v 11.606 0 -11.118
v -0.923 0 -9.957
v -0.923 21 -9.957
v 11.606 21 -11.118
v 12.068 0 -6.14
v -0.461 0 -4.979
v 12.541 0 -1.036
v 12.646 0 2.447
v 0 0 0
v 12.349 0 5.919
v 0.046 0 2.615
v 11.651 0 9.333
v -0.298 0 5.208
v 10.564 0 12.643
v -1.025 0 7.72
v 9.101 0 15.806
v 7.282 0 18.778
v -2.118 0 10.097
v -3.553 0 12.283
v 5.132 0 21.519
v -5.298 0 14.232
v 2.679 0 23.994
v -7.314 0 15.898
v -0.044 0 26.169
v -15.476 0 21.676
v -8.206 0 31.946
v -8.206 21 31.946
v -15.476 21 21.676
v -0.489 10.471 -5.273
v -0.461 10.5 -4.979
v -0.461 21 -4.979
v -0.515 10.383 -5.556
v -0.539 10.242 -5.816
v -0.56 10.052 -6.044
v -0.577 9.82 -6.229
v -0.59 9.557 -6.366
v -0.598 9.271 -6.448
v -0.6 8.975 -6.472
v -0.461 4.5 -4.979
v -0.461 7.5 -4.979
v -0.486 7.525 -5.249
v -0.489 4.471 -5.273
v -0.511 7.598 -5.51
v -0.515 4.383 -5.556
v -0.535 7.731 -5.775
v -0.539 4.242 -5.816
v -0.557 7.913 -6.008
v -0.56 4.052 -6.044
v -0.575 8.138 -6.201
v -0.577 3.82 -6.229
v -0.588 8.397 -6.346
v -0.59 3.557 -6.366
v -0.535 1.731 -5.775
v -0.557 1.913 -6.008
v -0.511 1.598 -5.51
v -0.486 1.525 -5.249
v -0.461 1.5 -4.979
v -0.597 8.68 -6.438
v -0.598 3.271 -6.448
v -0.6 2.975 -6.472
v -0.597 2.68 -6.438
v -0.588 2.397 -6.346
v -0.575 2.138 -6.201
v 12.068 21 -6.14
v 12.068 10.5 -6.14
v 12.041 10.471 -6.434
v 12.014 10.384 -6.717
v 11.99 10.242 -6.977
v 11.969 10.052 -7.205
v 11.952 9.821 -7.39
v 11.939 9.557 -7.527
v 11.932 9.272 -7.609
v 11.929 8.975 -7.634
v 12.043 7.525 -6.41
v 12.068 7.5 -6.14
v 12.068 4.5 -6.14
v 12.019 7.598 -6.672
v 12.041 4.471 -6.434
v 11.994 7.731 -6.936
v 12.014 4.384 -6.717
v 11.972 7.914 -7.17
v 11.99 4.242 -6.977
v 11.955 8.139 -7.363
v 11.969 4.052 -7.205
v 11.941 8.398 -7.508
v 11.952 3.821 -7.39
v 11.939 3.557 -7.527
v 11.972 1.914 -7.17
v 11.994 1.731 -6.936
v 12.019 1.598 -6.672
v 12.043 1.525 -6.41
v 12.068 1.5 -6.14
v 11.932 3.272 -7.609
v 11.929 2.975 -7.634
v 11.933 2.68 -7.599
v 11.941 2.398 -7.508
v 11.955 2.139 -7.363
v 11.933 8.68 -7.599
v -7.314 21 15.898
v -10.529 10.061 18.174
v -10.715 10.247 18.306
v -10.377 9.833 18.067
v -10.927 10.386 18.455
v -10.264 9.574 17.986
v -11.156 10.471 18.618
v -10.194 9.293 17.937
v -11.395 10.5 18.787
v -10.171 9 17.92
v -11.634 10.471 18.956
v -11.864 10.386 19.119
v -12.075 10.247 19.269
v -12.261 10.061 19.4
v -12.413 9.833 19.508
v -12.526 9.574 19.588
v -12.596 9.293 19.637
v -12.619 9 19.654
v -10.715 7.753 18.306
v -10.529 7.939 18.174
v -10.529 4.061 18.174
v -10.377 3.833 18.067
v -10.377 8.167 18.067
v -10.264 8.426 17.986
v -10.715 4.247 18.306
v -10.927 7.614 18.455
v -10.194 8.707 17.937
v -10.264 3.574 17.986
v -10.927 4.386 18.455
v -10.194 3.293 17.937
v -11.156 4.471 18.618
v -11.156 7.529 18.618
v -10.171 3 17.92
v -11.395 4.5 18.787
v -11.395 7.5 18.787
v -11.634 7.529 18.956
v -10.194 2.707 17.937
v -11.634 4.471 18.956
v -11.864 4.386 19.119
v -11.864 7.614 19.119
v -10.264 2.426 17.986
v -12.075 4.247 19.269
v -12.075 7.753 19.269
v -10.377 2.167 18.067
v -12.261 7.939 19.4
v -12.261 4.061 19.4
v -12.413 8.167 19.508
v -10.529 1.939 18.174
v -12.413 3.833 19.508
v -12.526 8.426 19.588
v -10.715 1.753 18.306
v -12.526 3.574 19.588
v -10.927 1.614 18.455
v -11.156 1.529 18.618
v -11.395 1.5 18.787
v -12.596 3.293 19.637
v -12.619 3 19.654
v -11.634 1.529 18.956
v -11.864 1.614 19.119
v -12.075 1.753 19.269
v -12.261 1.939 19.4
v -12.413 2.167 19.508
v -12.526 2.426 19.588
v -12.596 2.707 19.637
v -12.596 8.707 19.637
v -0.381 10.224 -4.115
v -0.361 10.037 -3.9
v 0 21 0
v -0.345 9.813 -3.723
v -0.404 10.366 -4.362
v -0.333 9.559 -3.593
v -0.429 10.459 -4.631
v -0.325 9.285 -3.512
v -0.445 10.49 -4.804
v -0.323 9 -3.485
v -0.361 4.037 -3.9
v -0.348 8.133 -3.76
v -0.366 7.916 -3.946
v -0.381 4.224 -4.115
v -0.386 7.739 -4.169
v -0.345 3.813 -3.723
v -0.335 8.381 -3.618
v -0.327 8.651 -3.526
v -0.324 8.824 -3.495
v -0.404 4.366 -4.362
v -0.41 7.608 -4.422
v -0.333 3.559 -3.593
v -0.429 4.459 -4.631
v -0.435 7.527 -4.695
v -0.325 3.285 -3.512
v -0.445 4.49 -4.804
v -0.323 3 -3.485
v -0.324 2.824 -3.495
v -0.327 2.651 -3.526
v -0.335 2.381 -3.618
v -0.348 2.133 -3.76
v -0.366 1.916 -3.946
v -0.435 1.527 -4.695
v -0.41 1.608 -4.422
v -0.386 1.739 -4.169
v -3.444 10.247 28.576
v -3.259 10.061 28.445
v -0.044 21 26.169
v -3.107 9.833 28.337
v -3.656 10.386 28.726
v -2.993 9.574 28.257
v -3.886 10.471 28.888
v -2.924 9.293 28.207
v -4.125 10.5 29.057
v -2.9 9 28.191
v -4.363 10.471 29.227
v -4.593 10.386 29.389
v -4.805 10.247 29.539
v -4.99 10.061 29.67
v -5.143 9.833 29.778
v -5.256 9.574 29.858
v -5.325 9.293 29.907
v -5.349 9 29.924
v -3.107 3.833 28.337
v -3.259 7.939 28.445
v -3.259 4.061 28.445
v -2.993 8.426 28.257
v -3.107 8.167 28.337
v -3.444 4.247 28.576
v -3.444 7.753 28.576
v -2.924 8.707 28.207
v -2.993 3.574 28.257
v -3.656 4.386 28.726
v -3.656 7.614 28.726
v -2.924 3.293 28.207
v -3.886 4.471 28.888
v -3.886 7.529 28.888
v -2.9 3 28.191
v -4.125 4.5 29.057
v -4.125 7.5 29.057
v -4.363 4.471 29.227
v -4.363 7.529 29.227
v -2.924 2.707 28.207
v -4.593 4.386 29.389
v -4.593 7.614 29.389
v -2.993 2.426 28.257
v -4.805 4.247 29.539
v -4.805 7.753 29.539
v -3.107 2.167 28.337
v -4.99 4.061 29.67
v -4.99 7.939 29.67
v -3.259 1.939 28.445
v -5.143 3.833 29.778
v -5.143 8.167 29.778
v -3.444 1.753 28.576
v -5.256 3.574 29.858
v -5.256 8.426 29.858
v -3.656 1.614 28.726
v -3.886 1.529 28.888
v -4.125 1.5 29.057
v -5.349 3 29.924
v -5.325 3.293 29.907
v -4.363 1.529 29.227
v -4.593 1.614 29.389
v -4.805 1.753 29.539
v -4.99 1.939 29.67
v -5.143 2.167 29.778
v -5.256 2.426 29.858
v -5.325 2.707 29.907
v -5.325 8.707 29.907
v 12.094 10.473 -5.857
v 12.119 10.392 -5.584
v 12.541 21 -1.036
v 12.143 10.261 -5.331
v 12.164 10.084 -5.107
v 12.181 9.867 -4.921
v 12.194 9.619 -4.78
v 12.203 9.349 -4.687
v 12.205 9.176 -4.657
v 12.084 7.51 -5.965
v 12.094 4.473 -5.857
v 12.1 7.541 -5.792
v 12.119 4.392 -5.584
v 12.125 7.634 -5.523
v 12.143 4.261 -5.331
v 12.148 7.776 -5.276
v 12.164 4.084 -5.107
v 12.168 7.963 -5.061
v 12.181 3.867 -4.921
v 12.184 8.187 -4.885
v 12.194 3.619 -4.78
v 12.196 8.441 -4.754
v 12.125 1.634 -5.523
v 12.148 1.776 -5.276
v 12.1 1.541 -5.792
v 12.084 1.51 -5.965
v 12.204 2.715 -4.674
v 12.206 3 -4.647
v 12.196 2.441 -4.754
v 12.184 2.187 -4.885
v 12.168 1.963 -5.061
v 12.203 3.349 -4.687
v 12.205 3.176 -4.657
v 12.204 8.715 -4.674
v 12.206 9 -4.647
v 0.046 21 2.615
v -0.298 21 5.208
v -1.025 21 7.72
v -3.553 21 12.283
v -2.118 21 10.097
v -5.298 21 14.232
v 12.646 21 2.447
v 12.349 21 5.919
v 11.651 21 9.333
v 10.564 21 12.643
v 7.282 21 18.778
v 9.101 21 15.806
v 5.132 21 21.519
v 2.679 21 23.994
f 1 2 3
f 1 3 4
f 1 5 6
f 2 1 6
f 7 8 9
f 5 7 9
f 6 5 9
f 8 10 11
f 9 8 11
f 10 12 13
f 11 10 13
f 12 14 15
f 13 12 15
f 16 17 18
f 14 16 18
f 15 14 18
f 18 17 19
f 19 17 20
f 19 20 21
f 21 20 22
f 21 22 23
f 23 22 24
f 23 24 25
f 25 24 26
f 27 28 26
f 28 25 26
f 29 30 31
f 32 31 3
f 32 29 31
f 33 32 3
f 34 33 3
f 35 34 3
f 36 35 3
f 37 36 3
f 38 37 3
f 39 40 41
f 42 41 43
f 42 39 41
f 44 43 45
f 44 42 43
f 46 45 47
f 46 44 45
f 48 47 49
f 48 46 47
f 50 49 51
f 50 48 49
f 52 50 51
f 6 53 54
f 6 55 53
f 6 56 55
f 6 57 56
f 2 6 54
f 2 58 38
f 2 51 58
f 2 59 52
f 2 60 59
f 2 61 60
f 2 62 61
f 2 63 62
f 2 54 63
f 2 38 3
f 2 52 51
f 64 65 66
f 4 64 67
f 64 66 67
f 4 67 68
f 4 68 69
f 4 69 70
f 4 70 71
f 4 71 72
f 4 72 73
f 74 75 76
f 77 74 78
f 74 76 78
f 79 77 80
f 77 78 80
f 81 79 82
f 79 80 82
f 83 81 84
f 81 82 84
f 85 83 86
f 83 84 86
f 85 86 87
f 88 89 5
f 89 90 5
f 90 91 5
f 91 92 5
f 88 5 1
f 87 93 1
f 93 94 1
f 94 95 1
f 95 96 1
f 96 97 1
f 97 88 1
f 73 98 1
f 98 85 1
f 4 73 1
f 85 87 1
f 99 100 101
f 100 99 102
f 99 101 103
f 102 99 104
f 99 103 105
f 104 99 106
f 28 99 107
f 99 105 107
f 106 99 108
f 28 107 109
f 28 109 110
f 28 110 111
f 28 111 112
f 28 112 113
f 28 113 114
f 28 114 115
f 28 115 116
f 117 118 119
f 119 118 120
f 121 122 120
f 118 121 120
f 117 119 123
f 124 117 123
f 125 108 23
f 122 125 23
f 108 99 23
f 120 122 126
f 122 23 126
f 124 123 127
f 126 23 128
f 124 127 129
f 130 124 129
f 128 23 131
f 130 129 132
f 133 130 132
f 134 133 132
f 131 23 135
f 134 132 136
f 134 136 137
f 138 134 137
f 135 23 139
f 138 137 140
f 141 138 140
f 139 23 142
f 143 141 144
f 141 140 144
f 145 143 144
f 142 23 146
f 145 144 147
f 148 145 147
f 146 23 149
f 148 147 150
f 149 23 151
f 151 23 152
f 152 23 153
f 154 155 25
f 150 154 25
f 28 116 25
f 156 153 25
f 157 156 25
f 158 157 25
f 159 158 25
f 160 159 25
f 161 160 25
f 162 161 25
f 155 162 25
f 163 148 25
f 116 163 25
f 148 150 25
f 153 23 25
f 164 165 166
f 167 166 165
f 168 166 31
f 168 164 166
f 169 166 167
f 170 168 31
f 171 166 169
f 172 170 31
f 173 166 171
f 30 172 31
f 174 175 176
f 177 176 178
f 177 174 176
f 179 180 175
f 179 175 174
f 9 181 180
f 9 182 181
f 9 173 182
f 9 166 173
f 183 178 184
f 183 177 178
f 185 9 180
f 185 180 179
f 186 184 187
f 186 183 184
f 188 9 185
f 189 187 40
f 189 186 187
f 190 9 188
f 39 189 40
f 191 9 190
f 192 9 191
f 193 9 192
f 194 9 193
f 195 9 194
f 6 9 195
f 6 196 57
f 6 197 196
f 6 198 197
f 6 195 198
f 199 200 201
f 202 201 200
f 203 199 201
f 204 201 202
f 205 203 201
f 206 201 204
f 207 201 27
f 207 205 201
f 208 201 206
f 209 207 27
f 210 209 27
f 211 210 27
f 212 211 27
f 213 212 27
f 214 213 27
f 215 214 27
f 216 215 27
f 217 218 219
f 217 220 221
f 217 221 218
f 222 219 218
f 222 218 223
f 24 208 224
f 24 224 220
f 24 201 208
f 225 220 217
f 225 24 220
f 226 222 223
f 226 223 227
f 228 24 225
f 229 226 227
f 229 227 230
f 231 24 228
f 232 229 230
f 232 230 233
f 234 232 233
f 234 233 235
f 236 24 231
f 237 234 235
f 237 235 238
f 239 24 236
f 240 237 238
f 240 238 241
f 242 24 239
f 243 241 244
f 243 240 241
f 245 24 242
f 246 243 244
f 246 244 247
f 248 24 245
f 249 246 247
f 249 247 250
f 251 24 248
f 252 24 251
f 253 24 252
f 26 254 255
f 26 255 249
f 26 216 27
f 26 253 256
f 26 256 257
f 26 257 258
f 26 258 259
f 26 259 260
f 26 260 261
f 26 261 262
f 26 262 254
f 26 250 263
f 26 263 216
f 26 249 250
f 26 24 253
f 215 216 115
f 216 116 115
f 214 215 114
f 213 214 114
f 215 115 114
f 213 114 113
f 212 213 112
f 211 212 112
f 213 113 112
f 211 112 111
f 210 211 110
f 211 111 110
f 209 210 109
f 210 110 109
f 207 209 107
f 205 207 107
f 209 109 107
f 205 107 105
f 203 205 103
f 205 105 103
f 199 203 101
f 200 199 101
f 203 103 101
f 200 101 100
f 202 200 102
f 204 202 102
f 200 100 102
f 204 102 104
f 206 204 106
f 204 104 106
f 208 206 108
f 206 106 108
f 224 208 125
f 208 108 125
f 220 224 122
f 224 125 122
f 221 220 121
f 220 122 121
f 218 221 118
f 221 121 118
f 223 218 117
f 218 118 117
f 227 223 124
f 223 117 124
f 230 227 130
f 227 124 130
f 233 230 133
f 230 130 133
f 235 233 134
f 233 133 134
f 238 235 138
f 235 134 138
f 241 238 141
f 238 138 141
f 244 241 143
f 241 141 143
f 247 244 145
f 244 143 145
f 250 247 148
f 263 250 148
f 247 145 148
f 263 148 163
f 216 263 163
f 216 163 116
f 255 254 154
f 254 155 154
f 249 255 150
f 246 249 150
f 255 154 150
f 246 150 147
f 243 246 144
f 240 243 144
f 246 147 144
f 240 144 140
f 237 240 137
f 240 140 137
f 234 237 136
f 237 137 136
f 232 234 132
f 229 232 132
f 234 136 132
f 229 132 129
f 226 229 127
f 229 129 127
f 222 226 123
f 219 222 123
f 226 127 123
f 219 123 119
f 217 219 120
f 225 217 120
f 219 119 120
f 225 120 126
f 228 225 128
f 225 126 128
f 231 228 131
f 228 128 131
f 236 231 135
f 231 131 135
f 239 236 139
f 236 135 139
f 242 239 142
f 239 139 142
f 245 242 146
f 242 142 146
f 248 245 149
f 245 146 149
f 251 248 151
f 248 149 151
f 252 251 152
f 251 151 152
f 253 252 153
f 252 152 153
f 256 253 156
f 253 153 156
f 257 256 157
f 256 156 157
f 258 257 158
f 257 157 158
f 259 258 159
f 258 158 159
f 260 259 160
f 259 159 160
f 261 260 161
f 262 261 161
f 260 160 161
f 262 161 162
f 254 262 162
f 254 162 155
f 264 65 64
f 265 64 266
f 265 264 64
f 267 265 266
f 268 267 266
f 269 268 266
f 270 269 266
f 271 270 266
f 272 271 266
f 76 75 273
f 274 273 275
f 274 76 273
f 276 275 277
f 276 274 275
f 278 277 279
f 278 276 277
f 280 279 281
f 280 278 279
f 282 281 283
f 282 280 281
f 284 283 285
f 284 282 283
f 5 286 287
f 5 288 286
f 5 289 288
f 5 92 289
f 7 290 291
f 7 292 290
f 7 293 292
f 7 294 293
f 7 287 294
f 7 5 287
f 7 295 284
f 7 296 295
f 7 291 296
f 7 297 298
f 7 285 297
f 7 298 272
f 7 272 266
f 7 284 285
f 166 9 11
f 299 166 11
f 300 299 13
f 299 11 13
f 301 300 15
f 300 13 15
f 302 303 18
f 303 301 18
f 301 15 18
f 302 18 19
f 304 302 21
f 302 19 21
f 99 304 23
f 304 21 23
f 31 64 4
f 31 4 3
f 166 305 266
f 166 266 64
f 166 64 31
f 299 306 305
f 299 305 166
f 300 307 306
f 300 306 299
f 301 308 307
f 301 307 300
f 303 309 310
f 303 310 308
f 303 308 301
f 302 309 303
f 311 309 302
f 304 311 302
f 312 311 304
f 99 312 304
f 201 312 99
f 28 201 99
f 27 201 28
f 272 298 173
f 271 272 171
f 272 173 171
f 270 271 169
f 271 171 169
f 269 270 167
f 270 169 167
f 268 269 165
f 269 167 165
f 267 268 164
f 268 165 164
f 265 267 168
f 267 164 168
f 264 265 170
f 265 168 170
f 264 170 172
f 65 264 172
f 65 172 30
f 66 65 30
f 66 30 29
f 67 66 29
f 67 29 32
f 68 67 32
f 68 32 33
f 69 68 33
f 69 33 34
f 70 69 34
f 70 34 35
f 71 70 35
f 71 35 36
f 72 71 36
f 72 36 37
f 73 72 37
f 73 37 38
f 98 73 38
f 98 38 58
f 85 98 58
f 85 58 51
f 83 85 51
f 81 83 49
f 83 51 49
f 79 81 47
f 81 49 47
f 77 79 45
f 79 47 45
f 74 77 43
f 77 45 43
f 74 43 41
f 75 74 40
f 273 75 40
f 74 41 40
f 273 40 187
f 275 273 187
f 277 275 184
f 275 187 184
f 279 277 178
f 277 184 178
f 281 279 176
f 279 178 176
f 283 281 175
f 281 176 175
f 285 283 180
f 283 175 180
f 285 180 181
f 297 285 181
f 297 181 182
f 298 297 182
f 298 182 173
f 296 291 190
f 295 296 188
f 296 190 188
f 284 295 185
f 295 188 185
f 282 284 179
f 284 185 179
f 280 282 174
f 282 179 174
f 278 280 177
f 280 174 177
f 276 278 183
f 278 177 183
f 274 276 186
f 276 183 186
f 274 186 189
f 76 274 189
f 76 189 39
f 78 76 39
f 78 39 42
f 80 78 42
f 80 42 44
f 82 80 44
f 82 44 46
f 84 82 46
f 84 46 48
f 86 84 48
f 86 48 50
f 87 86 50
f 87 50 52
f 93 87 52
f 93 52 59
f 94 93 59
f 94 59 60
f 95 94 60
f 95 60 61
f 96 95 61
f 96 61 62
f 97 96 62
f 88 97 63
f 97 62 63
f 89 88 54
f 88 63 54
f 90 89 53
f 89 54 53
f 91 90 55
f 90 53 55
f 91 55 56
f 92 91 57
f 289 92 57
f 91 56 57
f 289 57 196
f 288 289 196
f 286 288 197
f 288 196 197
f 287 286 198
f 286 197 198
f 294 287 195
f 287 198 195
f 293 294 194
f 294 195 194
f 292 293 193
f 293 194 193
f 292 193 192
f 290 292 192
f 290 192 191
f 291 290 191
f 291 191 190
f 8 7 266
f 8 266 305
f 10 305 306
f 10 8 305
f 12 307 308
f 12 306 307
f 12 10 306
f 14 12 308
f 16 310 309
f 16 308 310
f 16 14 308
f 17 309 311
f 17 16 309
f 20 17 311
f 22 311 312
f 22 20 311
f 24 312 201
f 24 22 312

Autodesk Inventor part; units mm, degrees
ref_plane "YZ Plane" through (0, 0, 0) normal (1, 0, 0) x (0, 1, 0)
ref_plane "XZ Plane" through (0, 0, 0) normal (0, 1, 0) x (-1, 0, 0)
ref_plane "XY Plane" through (0, 0, 0) normal (0, 0, 1) x (1, 0, 0)
sketch "Sketch1" plane through (0, 0, 0) normal (0, 1, 0) x (-1, 0, 0)
  arc A0 (7.3141, 15.8982) -> (0, 0) centre (17.4253, 1.6149) ccw
  arc A1 (0.0437, 26.1686) -> (-12.541, -1.0355) centre (17.4253, 1.6149) ccw
  line L0 (7.3141, 15.8982) -> (0.0437, 26.1686)
  line L1 (7.3141, 15.8982) -> (15.476, 21.6761)
  line L2 (0.0437, 26.1686) -> (9.8323, 33.098)
  line L3 (15.476, 21.6761) -> (8.2056, 31.9464)
  line L4 (11.395, 18.7872) -> (4.1246, 29.0575)
  line L5 (0, 0) -> (0.4614, -4.9787)
  line L6 (0.4614, -4.9787) -> (-12.0679, -6.1398)
  line L7 (-12.0679, -6.1398) -> (-12.541, -1.0355)
  line L8 (0.4614, -4.9787) -> (0.9228, -9.9573)
  line L9 (0.9228, -9.9573) -> (-11.6065, -11.1185)
  line L10 (-12.0679, -6.1398) -> (-11.6065, -11.1185)
  dimension "d3" = 10
  dimension "d5" = 12.5833
  dimension "d6" = 12.5833
  dimension "d8" = 17.5
  dimension "d9" = 5
  dimension "d11" = 5
  dimension "d12" = 12.583
  dimension "d13" = 60
  dimension "d14" = 90
  dimension "d16" = 90
  dimension "d17" = 5
extrude "Extrusion1" add sketch "Sketch1" along normal blind 21
sketch "Sketch2" plane through (0, 0, 0) normal (-0.9957, 0, 0.0923) x (0.0923, 0, 0.9957)
  circle A0 centre (-5, 9) radius 1.5
  line L0 (-10, 0) -> (0, 0) projected
  circle A1 centre (-5, 3) radius 1.5
  line L1 (-10, 0) -> (-10, 21) projected
  dimension "d20" = 3
  dimension "d22" = 3
  dimension "d23" = 6
  dimension "d24" = 3
  dimension "d25" = 5
  dimension "d26" = 5
sketch "Sketch3" plane through (-15.476, 0, 21.6761) normal (-0.5778, 0, -0.8162) x (-0.8162, 0, 0.5778)
  circle A0 centre (-5, 3) radius 1.5
  circle A1 centre (-5, 9) radius 1.5
  line L0 (-10, 0) -> (0, 0) projected
  line L1 (0, 0) -> (0, 21) projected
  point P0 (-25.1554, 0)
  dimension "d27" = 3
  dimension "d28" = 3
  dimension "d29" = 6
  dimension "d30" = 0
  dimension "d31" = 3
  dimension "d32" = 5
extrude "Extrusion2" cut sketch "Sketch3" against normal blind 300
extrude "Extrusion3" cut sketch "Sketch2" against normal through all
properties part number "Soporte"
